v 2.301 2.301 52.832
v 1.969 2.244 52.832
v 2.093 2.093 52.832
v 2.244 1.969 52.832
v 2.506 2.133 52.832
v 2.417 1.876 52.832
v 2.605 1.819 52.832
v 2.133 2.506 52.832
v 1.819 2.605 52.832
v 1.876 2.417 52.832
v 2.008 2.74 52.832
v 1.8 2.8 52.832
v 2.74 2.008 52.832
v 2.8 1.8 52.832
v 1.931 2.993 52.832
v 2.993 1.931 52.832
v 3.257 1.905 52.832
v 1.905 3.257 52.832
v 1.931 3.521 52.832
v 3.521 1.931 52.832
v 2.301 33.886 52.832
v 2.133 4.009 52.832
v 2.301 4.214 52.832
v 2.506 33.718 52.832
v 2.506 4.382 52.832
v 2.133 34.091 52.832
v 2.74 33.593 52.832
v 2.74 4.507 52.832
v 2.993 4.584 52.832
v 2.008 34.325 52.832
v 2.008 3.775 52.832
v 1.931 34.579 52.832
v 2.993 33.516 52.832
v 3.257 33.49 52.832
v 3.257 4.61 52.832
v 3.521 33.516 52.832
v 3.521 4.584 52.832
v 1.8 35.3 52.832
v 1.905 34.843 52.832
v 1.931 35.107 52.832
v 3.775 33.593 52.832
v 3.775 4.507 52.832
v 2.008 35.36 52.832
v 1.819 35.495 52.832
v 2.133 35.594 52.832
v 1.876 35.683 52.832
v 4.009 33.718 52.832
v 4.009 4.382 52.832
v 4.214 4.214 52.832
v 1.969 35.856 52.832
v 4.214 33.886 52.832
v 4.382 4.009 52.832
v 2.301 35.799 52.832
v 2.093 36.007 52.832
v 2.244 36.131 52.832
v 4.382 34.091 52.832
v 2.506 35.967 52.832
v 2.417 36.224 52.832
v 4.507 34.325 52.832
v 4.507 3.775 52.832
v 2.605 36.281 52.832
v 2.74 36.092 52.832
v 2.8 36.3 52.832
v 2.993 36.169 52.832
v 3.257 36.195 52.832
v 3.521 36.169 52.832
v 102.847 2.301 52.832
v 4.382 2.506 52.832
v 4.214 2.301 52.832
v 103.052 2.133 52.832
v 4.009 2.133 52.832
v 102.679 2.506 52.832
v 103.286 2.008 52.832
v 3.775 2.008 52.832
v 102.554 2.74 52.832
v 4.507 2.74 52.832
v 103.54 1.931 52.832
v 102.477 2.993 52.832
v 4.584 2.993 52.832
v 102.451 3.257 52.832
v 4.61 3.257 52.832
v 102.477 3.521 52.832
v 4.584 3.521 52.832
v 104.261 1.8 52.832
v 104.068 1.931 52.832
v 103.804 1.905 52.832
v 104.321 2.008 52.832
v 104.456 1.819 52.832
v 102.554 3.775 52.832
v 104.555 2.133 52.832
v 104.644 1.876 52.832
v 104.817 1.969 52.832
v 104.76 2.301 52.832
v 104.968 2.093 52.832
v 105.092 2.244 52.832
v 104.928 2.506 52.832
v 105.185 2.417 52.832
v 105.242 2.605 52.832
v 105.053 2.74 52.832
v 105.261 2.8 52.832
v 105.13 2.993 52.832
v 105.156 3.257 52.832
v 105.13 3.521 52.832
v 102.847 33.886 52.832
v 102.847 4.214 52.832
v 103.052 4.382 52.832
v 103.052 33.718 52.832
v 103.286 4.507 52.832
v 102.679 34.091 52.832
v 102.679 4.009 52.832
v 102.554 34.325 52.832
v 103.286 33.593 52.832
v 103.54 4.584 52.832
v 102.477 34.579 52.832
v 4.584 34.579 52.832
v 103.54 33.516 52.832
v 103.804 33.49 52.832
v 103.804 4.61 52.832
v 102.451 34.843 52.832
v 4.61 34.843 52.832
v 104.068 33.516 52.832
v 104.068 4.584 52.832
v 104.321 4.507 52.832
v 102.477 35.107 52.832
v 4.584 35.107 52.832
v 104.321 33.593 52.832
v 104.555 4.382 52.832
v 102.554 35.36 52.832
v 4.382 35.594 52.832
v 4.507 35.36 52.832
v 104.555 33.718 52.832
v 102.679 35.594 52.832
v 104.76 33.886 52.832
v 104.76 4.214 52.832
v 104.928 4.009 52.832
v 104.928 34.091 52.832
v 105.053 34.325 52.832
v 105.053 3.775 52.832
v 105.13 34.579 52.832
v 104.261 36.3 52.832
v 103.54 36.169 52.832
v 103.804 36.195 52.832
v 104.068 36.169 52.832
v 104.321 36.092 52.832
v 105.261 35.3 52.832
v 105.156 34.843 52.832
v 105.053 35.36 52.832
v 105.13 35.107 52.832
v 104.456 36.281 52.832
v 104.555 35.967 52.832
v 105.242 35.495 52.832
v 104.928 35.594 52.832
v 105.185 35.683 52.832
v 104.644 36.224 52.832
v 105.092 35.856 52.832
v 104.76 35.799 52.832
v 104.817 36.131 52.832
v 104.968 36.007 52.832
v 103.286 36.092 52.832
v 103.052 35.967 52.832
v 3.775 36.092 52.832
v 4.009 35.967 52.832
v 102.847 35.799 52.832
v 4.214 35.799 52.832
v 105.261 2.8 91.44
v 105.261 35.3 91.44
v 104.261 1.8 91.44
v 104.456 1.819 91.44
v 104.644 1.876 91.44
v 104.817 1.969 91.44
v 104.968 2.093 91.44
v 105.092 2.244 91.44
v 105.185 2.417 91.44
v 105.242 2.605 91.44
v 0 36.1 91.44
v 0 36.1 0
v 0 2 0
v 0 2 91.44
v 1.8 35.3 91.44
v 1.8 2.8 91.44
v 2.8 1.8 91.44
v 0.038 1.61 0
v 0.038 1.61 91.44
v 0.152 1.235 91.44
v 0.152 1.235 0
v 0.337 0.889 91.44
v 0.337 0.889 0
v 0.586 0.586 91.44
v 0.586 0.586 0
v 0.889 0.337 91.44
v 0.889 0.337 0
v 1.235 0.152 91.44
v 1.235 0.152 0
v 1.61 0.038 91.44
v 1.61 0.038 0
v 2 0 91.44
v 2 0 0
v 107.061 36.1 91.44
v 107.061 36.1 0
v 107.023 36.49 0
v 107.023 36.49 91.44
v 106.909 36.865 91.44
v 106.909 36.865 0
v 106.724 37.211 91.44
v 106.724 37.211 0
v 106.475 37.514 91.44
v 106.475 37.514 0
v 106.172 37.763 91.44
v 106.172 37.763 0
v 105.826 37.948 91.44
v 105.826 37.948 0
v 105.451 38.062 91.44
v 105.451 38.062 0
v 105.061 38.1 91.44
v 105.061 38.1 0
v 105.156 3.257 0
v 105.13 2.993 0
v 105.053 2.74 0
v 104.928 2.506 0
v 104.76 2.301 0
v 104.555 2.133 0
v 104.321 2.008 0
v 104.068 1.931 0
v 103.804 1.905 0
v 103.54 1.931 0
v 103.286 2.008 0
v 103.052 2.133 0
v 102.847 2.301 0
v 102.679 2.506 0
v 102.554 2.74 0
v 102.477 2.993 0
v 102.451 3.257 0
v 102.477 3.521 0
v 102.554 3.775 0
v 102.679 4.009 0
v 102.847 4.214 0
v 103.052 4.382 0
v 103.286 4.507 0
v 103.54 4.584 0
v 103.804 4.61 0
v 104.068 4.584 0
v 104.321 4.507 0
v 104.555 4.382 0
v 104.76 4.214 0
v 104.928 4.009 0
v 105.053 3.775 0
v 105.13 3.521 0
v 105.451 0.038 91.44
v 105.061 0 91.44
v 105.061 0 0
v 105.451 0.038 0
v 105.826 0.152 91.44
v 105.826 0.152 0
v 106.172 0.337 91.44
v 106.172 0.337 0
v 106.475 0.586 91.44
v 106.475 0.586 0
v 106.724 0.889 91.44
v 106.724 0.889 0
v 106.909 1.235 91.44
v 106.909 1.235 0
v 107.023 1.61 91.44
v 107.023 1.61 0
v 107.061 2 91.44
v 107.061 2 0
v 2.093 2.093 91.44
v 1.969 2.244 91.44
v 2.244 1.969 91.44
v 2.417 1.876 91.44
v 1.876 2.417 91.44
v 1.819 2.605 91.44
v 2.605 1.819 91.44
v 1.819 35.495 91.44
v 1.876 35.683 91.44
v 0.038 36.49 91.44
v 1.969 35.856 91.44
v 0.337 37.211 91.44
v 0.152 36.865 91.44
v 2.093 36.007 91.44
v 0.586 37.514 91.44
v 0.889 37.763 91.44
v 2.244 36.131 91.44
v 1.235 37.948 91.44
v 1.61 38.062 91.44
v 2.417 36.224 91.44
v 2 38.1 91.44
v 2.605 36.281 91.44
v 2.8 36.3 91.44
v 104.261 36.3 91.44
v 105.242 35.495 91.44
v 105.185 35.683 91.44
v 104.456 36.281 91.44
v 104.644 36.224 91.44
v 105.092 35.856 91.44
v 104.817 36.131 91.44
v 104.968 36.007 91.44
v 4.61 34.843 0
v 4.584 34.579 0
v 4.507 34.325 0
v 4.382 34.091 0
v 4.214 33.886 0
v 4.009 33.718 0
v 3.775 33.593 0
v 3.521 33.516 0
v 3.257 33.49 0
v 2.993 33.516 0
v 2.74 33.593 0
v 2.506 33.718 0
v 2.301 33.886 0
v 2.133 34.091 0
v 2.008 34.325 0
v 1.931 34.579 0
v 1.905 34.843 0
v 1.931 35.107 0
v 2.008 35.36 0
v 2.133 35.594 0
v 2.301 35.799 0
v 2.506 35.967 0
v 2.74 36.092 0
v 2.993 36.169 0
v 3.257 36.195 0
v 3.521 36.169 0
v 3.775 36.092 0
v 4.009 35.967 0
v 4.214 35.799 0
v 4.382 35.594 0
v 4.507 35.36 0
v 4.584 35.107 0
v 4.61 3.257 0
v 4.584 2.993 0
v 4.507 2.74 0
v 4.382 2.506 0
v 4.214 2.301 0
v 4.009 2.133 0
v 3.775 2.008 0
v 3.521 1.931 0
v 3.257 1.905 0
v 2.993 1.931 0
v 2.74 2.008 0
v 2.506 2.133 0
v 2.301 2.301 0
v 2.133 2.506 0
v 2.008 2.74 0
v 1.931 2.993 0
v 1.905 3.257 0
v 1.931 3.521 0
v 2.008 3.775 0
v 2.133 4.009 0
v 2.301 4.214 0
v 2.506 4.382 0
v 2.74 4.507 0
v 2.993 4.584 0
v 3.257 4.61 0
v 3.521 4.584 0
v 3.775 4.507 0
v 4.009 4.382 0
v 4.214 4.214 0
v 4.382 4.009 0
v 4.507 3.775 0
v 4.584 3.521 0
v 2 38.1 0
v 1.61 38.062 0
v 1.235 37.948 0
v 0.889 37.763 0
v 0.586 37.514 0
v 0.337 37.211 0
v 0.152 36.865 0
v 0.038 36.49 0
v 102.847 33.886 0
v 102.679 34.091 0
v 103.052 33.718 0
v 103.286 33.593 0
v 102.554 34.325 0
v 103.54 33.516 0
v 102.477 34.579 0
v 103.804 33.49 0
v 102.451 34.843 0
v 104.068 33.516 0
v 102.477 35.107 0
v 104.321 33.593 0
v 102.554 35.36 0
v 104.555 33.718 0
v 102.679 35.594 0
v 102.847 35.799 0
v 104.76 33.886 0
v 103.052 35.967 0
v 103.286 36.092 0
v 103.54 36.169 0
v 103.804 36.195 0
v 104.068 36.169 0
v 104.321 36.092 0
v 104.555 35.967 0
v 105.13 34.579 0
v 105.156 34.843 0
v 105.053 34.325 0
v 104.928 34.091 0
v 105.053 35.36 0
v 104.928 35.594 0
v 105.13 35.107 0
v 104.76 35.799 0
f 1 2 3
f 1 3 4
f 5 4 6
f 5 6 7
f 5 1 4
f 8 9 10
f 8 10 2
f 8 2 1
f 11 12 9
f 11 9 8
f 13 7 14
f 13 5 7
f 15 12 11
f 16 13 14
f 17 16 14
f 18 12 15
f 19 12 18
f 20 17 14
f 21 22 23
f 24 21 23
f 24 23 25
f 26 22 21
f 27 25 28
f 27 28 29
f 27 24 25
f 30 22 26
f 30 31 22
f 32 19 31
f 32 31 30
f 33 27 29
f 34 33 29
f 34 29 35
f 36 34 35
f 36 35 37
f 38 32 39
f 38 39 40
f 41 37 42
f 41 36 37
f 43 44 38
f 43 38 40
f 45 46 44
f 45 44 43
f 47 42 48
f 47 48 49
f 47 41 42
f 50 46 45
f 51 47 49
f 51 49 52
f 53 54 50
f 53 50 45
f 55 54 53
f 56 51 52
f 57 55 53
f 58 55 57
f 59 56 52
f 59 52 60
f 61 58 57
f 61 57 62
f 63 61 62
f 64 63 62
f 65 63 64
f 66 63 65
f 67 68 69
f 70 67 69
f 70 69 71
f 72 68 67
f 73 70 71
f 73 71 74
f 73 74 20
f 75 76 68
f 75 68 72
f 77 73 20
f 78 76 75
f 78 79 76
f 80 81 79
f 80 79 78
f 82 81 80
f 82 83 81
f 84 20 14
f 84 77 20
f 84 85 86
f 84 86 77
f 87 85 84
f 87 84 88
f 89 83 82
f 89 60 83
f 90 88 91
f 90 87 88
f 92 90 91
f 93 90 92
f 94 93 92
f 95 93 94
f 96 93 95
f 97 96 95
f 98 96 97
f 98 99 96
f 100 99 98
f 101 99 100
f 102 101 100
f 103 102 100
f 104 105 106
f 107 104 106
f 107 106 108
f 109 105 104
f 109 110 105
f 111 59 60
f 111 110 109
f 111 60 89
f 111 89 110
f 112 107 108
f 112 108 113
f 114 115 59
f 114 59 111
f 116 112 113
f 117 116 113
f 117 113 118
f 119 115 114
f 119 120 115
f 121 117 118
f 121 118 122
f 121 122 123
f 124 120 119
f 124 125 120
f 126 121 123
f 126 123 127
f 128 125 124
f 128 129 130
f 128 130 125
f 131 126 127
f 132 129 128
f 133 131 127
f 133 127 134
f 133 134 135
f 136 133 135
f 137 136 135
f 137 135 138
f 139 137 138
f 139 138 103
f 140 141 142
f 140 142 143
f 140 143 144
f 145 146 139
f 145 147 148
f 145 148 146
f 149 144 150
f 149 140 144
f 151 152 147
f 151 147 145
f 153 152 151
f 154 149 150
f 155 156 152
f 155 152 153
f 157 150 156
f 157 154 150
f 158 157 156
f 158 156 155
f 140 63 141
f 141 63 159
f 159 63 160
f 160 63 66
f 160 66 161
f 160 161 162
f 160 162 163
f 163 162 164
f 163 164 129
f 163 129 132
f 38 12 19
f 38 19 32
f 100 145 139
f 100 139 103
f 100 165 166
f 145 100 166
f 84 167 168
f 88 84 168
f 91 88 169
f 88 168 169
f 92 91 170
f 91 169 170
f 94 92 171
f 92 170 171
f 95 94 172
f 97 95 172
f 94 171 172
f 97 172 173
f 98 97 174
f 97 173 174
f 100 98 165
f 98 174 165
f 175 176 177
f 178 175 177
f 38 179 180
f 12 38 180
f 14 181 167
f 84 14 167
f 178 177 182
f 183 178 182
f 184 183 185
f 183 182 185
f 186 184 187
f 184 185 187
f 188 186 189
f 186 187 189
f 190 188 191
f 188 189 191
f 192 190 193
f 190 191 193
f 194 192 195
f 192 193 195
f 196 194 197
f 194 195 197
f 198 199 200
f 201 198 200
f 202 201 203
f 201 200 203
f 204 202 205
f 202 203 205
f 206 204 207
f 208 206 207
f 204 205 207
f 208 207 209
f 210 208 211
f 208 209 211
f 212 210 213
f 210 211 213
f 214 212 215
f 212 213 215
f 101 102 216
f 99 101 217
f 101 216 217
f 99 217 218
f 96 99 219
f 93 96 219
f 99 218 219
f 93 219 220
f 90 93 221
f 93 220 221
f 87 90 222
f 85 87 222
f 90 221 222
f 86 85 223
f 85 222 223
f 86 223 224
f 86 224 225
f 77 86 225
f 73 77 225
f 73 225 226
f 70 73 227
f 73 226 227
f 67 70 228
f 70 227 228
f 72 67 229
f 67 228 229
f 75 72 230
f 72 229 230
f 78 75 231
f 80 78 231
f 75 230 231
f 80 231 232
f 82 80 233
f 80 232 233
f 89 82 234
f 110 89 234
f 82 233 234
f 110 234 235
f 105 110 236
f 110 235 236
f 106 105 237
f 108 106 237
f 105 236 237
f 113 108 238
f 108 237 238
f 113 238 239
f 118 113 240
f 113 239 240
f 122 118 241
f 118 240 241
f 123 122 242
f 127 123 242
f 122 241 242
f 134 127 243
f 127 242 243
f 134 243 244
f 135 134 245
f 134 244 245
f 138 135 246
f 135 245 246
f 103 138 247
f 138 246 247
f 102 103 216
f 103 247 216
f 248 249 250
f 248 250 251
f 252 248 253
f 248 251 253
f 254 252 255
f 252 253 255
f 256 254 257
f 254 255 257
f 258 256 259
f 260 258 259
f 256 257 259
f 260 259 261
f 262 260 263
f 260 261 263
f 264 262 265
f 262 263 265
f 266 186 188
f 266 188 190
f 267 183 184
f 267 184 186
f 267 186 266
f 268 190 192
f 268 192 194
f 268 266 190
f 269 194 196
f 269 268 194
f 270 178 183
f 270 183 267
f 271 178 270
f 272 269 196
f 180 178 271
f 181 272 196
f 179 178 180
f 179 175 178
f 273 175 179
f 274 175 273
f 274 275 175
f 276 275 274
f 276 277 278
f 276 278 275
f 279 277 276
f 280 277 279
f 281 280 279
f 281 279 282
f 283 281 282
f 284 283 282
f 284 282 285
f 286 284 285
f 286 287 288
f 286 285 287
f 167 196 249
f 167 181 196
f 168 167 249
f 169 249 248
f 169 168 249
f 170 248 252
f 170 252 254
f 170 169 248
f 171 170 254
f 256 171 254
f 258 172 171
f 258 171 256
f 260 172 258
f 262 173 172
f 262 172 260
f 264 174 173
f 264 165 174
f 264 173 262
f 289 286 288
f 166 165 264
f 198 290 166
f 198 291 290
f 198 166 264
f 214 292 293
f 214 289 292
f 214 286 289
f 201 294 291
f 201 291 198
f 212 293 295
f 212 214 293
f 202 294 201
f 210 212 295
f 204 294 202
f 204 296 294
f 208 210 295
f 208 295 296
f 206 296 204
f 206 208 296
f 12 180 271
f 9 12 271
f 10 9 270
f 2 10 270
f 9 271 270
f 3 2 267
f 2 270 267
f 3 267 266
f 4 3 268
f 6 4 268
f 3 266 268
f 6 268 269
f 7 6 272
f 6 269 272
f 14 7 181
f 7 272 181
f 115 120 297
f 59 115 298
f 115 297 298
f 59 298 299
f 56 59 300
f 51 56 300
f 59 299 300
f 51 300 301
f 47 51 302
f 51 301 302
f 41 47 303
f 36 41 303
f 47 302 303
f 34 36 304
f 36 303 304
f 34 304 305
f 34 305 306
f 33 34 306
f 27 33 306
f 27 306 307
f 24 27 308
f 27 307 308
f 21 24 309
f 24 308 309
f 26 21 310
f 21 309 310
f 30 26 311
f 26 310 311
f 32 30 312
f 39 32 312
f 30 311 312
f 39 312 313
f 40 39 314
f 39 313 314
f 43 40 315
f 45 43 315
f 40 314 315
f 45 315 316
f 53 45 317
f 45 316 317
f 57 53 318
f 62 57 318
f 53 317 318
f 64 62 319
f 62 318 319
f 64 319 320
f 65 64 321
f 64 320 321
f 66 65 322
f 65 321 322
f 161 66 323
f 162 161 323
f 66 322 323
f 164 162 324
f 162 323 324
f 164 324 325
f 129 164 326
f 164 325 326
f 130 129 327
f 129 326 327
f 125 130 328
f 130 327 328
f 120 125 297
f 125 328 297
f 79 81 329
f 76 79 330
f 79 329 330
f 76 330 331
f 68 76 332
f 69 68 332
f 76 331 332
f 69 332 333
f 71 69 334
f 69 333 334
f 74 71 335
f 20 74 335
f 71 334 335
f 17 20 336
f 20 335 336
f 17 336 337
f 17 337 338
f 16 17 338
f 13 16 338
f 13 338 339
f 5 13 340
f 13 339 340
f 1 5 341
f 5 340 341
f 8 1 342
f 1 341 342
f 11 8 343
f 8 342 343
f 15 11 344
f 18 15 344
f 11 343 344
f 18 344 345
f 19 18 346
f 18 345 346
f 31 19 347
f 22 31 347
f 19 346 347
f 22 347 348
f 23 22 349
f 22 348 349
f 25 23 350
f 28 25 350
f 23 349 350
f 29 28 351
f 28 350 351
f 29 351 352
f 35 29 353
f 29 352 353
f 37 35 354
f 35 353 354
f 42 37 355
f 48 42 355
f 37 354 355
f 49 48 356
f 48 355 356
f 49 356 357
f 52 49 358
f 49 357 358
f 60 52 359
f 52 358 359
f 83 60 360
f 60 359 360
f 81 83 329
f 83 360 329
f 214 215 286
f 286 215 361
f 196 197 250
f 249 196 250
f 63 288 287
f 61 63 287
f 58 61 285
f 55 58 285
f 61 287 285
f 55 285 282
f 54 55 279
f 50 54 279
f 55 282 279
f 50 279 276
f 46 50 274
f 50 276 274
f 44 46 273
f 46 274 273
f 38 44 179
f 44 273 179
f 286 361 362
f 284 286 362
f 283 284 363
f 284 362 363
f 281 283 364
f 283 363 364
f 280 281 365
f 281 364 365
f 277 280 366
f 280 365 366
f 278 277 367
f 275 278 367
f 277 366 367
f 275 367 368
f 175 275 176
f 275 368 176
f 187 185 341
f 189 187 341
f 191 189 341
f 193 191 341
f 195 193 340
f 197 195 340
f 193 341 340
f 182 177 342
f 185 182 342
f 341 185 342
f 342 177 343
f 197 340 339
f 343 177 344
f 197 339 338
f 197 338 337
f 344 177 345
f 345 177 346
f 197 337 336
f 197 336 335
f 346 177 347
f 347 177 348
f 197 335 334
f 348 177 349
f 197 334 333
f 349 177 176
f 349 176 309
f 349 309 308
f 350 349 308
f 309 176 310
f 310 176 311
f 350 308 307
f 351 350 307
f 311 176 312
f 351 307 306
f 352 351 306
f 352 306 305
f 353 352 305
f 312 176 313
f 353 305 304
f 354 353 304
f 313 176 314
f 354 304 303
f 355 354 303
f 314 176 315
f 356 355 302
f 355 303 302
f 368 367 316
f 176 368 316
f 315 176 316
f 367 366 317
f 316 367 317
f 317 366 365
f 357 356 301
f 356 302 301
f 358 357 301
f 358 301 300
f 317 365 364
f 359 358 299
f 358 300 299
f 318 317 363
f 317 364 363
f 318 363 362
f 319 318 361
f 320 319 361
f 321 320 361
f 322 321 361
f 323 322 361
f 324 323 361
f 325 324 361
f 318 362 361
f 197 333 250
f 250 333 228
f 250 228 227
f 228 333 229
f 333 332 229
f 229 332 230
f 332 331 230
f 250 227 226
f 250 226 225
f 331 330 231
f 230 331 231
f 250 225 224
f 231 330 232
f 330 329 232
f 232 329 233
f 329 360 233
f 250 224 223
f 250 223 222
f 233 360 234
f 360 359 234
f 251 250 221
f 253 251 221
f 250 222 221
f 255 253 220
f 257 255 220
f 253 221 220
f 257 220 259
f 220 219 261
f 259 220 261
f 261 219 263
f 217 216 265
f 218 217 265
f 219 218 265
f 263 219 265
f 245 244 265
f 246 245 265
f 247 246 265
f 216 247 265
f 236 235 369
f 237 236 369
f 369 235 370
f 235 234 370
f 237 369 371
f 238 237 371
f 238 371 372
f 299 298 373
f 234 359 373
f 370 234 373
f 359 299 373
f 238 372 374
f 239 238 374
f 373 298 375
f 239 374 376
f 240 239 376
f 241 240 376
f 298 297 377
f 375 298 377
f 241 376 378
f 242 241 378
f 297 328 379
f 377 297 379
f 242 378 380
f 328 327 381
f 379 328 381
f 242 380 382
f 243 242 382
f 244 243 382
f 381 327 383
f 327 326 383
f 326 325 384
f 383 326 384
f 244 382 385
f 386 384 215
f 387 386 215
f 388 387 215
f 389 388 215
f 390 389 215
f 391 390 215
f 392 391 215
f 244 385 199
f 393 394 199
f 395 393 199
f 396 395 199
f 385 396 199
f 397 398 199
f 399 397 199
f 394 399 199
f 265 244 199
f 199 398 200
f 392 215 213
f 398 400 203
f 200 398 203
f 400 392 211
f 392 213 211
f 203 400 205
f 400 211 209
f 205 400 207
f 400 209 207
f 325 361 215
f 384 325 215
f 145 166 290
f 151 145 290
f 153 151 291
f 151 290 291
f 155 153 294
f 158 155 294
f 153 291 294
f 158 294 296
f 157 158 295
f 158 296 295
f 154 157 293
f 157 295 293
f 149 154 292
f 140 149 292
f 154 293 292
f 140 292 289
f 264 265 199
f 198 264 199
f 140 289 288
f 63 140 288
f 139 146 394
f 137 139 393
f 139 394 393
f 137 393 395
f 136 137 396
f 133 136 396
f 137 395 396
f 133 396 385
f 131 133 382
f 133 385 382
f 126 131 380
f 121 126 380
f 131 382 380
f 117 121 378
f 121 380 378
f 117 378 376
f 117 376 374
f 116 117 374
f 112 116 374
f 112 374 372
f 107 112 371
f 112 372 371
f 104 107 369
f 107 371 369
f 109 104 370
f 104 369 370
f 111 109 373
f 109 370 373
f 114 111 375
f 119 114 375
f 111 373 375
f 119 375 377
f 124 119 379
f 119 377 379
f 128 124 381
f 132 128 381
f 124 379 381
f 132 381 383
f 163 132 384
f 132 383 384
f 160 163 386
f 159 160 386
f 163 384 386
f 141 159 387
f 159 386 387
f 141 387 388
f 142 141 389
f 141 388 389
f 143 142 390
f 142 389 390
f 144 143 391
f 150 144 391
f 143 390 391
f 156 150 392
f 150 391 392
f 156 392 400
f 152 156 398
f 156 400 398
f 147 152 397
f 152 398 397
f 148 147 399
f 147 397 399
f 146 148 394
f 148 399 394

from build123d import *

# Parameters (mm, degrees)
F1_DEPTH = 91.44
F3_DEPTH = 38.608
F5_DEPTH = 4.7752
F6_R     = 1.35255
F7_DEPTH = 52.832


# Not quite as in the source:
# - a feature names something its author has since deleted; it is built from what else it names


with BuildPart() as f1:
    # F0 (on Top) → F1 (new body)
    with BuildSketch(Plane.XY):
        with BuildLine():
            ThreePointArc((0, 2), (0.5857864376, 0.5857864376), (2, 0))
            Line((2, 0), (105.061, 0))
            ThreePointArc((105.061, 0), (106.4752135624, 0.5857864376), (107.061, 2))
            Line((107.061, 2), (107.061, 36.1))
            ThreePointArc((107.061, 36.1), (106.4752135624, 37.5142135624), (105.061, 38.1))
            Line((105.061, 38.1), (2, 38.1))
            ThreePointArc((2, 38.1), (0.5857864376, 37.5142135624), (0, 36.1))
            Line((0, 36.1), (0, 2))
        make_face()
    extrude(amount=F1_DEPTH)

    # F2 (on face) → F3 (cut)
    with BuildSketch(Plane.XY.offset(91.44)):
        with BuildLine():
            Line((104.261, 36.3), (2.8, 36.3))
            ThreePointArc((2.8, 36.3), (2.0928932188, 36.0071067812), (1.8, 35.3))
            Line((1.8, 35.3), (1.8, 2.8))
            ThreePointArc((1.8, 2.8), (2.0928932188, 2.0928932188), (2.8, 1.8))
            Line((2.8, 1.8), (104.261, 1.8))
            ThreePointArc((104.261, 1.8), (104.9681067812, 2.0928932188), (105.261, 2.8))
            Line((105.261, 2.8), (105.261, 35.3))
            ThreePointArc((105.261, 35.3), (104.9681067812, 36.0071067812), (104.261, 36.3))
        make_face()
    extrude(amount=-F3_DEPTH, mode=Mode.SUBTRACT)

    # F4 (on face) → F5 (join)
    with BuildSketch(Plane(origin=(0, 0, 0), x_dir=(1, 0, 0), z_dir=(0, 0, -1))):
        with BuildLine():
            ThreePointArc((107.061, -2), (106.4752135624, -0.5857864376), (105.061, 0))
            Line((105.061, 0), (101.251, 0))
            Line((101.251, 0), (101.251, -2))
            ThreePointArc((101.251, -2), (102.3669231637, -4.6940768363), (105.061, -5.81))
            Line((105.061, -5.81), (107.061, -5.81))
            Line((107.061, -5.81), (107.061, -2))
        make_face()
        with BuildLine():
            Line((101.251, -36.1), (101.251, -38.1))
            Line((101.251, -38.1), (105.061, -38.1))
            ThreePointArc((105.061, -38.1), (106.4752135624, -37.5142135624), (107.061, -36.1))
            Line((107.061, -36.1), (107.061, -32.29))
            Line((107.061, -32.29), (105.061, -32.29))
            ThreePointArc((105.061, -32.29), (102.3669231637, -33.4059231637), (101.251, -36.1))
        make_face()
        with BuildLine():
            ThreePointArc((5.81, -36.1), (4.6940768363, -33.4059231637), (2, -32.29))
            Line((2, -32.29), (0, -32.29))
            Line((0, -32.29), (0, -36.1))
            ThreePointArc((0, -36.1), (0.5857864376, -37.5142135624), (2, -38.1))
            Line((2, -38.1), (5.81, -38.1))
            Line((5.81, -38.1), (5.81, -36.1))
        make_face()
        with BuildLine():
            Line((5.81, 0), (2, 0))
            ThreePointArc((2, 0), (0.5857864376, -0.5857864376), (0, -2))
            Line((0, -2), (0, -5.81))
            Line((0, -5.81), (2, -5.81))
            ThreePointArc((2, -5.81), (4.6940768363, -4.6940768363), (5.81, -2))
            Line((5.81, -2), (5.81, 0))
        make_face()
    extrude(amount=-F5_DEPTH)

    # F6 (on face) → F7 (cut, through all)
    with BuildSketch(Plane(origin=(0, 0, 0), x_dir=(1, 0, 0), z_dir=(0, 0, -1))):
        with Locations((103.8037641431, -3.2572358569)):
            Circle(F6_R)
        with Locations((3.2572358569, -3.2572358569)):
            Circle(F6_R)
        with Locations((3.2572358569, -34.8427641431)):
            Circle(F6_R)
        with Locations((103.8037641431, -34.8427641431)):
            Circle(F6_R)
    extrude(amount=-F7_DEPTH, mode=Mode.SUBTRACT)


solid = f1.part
